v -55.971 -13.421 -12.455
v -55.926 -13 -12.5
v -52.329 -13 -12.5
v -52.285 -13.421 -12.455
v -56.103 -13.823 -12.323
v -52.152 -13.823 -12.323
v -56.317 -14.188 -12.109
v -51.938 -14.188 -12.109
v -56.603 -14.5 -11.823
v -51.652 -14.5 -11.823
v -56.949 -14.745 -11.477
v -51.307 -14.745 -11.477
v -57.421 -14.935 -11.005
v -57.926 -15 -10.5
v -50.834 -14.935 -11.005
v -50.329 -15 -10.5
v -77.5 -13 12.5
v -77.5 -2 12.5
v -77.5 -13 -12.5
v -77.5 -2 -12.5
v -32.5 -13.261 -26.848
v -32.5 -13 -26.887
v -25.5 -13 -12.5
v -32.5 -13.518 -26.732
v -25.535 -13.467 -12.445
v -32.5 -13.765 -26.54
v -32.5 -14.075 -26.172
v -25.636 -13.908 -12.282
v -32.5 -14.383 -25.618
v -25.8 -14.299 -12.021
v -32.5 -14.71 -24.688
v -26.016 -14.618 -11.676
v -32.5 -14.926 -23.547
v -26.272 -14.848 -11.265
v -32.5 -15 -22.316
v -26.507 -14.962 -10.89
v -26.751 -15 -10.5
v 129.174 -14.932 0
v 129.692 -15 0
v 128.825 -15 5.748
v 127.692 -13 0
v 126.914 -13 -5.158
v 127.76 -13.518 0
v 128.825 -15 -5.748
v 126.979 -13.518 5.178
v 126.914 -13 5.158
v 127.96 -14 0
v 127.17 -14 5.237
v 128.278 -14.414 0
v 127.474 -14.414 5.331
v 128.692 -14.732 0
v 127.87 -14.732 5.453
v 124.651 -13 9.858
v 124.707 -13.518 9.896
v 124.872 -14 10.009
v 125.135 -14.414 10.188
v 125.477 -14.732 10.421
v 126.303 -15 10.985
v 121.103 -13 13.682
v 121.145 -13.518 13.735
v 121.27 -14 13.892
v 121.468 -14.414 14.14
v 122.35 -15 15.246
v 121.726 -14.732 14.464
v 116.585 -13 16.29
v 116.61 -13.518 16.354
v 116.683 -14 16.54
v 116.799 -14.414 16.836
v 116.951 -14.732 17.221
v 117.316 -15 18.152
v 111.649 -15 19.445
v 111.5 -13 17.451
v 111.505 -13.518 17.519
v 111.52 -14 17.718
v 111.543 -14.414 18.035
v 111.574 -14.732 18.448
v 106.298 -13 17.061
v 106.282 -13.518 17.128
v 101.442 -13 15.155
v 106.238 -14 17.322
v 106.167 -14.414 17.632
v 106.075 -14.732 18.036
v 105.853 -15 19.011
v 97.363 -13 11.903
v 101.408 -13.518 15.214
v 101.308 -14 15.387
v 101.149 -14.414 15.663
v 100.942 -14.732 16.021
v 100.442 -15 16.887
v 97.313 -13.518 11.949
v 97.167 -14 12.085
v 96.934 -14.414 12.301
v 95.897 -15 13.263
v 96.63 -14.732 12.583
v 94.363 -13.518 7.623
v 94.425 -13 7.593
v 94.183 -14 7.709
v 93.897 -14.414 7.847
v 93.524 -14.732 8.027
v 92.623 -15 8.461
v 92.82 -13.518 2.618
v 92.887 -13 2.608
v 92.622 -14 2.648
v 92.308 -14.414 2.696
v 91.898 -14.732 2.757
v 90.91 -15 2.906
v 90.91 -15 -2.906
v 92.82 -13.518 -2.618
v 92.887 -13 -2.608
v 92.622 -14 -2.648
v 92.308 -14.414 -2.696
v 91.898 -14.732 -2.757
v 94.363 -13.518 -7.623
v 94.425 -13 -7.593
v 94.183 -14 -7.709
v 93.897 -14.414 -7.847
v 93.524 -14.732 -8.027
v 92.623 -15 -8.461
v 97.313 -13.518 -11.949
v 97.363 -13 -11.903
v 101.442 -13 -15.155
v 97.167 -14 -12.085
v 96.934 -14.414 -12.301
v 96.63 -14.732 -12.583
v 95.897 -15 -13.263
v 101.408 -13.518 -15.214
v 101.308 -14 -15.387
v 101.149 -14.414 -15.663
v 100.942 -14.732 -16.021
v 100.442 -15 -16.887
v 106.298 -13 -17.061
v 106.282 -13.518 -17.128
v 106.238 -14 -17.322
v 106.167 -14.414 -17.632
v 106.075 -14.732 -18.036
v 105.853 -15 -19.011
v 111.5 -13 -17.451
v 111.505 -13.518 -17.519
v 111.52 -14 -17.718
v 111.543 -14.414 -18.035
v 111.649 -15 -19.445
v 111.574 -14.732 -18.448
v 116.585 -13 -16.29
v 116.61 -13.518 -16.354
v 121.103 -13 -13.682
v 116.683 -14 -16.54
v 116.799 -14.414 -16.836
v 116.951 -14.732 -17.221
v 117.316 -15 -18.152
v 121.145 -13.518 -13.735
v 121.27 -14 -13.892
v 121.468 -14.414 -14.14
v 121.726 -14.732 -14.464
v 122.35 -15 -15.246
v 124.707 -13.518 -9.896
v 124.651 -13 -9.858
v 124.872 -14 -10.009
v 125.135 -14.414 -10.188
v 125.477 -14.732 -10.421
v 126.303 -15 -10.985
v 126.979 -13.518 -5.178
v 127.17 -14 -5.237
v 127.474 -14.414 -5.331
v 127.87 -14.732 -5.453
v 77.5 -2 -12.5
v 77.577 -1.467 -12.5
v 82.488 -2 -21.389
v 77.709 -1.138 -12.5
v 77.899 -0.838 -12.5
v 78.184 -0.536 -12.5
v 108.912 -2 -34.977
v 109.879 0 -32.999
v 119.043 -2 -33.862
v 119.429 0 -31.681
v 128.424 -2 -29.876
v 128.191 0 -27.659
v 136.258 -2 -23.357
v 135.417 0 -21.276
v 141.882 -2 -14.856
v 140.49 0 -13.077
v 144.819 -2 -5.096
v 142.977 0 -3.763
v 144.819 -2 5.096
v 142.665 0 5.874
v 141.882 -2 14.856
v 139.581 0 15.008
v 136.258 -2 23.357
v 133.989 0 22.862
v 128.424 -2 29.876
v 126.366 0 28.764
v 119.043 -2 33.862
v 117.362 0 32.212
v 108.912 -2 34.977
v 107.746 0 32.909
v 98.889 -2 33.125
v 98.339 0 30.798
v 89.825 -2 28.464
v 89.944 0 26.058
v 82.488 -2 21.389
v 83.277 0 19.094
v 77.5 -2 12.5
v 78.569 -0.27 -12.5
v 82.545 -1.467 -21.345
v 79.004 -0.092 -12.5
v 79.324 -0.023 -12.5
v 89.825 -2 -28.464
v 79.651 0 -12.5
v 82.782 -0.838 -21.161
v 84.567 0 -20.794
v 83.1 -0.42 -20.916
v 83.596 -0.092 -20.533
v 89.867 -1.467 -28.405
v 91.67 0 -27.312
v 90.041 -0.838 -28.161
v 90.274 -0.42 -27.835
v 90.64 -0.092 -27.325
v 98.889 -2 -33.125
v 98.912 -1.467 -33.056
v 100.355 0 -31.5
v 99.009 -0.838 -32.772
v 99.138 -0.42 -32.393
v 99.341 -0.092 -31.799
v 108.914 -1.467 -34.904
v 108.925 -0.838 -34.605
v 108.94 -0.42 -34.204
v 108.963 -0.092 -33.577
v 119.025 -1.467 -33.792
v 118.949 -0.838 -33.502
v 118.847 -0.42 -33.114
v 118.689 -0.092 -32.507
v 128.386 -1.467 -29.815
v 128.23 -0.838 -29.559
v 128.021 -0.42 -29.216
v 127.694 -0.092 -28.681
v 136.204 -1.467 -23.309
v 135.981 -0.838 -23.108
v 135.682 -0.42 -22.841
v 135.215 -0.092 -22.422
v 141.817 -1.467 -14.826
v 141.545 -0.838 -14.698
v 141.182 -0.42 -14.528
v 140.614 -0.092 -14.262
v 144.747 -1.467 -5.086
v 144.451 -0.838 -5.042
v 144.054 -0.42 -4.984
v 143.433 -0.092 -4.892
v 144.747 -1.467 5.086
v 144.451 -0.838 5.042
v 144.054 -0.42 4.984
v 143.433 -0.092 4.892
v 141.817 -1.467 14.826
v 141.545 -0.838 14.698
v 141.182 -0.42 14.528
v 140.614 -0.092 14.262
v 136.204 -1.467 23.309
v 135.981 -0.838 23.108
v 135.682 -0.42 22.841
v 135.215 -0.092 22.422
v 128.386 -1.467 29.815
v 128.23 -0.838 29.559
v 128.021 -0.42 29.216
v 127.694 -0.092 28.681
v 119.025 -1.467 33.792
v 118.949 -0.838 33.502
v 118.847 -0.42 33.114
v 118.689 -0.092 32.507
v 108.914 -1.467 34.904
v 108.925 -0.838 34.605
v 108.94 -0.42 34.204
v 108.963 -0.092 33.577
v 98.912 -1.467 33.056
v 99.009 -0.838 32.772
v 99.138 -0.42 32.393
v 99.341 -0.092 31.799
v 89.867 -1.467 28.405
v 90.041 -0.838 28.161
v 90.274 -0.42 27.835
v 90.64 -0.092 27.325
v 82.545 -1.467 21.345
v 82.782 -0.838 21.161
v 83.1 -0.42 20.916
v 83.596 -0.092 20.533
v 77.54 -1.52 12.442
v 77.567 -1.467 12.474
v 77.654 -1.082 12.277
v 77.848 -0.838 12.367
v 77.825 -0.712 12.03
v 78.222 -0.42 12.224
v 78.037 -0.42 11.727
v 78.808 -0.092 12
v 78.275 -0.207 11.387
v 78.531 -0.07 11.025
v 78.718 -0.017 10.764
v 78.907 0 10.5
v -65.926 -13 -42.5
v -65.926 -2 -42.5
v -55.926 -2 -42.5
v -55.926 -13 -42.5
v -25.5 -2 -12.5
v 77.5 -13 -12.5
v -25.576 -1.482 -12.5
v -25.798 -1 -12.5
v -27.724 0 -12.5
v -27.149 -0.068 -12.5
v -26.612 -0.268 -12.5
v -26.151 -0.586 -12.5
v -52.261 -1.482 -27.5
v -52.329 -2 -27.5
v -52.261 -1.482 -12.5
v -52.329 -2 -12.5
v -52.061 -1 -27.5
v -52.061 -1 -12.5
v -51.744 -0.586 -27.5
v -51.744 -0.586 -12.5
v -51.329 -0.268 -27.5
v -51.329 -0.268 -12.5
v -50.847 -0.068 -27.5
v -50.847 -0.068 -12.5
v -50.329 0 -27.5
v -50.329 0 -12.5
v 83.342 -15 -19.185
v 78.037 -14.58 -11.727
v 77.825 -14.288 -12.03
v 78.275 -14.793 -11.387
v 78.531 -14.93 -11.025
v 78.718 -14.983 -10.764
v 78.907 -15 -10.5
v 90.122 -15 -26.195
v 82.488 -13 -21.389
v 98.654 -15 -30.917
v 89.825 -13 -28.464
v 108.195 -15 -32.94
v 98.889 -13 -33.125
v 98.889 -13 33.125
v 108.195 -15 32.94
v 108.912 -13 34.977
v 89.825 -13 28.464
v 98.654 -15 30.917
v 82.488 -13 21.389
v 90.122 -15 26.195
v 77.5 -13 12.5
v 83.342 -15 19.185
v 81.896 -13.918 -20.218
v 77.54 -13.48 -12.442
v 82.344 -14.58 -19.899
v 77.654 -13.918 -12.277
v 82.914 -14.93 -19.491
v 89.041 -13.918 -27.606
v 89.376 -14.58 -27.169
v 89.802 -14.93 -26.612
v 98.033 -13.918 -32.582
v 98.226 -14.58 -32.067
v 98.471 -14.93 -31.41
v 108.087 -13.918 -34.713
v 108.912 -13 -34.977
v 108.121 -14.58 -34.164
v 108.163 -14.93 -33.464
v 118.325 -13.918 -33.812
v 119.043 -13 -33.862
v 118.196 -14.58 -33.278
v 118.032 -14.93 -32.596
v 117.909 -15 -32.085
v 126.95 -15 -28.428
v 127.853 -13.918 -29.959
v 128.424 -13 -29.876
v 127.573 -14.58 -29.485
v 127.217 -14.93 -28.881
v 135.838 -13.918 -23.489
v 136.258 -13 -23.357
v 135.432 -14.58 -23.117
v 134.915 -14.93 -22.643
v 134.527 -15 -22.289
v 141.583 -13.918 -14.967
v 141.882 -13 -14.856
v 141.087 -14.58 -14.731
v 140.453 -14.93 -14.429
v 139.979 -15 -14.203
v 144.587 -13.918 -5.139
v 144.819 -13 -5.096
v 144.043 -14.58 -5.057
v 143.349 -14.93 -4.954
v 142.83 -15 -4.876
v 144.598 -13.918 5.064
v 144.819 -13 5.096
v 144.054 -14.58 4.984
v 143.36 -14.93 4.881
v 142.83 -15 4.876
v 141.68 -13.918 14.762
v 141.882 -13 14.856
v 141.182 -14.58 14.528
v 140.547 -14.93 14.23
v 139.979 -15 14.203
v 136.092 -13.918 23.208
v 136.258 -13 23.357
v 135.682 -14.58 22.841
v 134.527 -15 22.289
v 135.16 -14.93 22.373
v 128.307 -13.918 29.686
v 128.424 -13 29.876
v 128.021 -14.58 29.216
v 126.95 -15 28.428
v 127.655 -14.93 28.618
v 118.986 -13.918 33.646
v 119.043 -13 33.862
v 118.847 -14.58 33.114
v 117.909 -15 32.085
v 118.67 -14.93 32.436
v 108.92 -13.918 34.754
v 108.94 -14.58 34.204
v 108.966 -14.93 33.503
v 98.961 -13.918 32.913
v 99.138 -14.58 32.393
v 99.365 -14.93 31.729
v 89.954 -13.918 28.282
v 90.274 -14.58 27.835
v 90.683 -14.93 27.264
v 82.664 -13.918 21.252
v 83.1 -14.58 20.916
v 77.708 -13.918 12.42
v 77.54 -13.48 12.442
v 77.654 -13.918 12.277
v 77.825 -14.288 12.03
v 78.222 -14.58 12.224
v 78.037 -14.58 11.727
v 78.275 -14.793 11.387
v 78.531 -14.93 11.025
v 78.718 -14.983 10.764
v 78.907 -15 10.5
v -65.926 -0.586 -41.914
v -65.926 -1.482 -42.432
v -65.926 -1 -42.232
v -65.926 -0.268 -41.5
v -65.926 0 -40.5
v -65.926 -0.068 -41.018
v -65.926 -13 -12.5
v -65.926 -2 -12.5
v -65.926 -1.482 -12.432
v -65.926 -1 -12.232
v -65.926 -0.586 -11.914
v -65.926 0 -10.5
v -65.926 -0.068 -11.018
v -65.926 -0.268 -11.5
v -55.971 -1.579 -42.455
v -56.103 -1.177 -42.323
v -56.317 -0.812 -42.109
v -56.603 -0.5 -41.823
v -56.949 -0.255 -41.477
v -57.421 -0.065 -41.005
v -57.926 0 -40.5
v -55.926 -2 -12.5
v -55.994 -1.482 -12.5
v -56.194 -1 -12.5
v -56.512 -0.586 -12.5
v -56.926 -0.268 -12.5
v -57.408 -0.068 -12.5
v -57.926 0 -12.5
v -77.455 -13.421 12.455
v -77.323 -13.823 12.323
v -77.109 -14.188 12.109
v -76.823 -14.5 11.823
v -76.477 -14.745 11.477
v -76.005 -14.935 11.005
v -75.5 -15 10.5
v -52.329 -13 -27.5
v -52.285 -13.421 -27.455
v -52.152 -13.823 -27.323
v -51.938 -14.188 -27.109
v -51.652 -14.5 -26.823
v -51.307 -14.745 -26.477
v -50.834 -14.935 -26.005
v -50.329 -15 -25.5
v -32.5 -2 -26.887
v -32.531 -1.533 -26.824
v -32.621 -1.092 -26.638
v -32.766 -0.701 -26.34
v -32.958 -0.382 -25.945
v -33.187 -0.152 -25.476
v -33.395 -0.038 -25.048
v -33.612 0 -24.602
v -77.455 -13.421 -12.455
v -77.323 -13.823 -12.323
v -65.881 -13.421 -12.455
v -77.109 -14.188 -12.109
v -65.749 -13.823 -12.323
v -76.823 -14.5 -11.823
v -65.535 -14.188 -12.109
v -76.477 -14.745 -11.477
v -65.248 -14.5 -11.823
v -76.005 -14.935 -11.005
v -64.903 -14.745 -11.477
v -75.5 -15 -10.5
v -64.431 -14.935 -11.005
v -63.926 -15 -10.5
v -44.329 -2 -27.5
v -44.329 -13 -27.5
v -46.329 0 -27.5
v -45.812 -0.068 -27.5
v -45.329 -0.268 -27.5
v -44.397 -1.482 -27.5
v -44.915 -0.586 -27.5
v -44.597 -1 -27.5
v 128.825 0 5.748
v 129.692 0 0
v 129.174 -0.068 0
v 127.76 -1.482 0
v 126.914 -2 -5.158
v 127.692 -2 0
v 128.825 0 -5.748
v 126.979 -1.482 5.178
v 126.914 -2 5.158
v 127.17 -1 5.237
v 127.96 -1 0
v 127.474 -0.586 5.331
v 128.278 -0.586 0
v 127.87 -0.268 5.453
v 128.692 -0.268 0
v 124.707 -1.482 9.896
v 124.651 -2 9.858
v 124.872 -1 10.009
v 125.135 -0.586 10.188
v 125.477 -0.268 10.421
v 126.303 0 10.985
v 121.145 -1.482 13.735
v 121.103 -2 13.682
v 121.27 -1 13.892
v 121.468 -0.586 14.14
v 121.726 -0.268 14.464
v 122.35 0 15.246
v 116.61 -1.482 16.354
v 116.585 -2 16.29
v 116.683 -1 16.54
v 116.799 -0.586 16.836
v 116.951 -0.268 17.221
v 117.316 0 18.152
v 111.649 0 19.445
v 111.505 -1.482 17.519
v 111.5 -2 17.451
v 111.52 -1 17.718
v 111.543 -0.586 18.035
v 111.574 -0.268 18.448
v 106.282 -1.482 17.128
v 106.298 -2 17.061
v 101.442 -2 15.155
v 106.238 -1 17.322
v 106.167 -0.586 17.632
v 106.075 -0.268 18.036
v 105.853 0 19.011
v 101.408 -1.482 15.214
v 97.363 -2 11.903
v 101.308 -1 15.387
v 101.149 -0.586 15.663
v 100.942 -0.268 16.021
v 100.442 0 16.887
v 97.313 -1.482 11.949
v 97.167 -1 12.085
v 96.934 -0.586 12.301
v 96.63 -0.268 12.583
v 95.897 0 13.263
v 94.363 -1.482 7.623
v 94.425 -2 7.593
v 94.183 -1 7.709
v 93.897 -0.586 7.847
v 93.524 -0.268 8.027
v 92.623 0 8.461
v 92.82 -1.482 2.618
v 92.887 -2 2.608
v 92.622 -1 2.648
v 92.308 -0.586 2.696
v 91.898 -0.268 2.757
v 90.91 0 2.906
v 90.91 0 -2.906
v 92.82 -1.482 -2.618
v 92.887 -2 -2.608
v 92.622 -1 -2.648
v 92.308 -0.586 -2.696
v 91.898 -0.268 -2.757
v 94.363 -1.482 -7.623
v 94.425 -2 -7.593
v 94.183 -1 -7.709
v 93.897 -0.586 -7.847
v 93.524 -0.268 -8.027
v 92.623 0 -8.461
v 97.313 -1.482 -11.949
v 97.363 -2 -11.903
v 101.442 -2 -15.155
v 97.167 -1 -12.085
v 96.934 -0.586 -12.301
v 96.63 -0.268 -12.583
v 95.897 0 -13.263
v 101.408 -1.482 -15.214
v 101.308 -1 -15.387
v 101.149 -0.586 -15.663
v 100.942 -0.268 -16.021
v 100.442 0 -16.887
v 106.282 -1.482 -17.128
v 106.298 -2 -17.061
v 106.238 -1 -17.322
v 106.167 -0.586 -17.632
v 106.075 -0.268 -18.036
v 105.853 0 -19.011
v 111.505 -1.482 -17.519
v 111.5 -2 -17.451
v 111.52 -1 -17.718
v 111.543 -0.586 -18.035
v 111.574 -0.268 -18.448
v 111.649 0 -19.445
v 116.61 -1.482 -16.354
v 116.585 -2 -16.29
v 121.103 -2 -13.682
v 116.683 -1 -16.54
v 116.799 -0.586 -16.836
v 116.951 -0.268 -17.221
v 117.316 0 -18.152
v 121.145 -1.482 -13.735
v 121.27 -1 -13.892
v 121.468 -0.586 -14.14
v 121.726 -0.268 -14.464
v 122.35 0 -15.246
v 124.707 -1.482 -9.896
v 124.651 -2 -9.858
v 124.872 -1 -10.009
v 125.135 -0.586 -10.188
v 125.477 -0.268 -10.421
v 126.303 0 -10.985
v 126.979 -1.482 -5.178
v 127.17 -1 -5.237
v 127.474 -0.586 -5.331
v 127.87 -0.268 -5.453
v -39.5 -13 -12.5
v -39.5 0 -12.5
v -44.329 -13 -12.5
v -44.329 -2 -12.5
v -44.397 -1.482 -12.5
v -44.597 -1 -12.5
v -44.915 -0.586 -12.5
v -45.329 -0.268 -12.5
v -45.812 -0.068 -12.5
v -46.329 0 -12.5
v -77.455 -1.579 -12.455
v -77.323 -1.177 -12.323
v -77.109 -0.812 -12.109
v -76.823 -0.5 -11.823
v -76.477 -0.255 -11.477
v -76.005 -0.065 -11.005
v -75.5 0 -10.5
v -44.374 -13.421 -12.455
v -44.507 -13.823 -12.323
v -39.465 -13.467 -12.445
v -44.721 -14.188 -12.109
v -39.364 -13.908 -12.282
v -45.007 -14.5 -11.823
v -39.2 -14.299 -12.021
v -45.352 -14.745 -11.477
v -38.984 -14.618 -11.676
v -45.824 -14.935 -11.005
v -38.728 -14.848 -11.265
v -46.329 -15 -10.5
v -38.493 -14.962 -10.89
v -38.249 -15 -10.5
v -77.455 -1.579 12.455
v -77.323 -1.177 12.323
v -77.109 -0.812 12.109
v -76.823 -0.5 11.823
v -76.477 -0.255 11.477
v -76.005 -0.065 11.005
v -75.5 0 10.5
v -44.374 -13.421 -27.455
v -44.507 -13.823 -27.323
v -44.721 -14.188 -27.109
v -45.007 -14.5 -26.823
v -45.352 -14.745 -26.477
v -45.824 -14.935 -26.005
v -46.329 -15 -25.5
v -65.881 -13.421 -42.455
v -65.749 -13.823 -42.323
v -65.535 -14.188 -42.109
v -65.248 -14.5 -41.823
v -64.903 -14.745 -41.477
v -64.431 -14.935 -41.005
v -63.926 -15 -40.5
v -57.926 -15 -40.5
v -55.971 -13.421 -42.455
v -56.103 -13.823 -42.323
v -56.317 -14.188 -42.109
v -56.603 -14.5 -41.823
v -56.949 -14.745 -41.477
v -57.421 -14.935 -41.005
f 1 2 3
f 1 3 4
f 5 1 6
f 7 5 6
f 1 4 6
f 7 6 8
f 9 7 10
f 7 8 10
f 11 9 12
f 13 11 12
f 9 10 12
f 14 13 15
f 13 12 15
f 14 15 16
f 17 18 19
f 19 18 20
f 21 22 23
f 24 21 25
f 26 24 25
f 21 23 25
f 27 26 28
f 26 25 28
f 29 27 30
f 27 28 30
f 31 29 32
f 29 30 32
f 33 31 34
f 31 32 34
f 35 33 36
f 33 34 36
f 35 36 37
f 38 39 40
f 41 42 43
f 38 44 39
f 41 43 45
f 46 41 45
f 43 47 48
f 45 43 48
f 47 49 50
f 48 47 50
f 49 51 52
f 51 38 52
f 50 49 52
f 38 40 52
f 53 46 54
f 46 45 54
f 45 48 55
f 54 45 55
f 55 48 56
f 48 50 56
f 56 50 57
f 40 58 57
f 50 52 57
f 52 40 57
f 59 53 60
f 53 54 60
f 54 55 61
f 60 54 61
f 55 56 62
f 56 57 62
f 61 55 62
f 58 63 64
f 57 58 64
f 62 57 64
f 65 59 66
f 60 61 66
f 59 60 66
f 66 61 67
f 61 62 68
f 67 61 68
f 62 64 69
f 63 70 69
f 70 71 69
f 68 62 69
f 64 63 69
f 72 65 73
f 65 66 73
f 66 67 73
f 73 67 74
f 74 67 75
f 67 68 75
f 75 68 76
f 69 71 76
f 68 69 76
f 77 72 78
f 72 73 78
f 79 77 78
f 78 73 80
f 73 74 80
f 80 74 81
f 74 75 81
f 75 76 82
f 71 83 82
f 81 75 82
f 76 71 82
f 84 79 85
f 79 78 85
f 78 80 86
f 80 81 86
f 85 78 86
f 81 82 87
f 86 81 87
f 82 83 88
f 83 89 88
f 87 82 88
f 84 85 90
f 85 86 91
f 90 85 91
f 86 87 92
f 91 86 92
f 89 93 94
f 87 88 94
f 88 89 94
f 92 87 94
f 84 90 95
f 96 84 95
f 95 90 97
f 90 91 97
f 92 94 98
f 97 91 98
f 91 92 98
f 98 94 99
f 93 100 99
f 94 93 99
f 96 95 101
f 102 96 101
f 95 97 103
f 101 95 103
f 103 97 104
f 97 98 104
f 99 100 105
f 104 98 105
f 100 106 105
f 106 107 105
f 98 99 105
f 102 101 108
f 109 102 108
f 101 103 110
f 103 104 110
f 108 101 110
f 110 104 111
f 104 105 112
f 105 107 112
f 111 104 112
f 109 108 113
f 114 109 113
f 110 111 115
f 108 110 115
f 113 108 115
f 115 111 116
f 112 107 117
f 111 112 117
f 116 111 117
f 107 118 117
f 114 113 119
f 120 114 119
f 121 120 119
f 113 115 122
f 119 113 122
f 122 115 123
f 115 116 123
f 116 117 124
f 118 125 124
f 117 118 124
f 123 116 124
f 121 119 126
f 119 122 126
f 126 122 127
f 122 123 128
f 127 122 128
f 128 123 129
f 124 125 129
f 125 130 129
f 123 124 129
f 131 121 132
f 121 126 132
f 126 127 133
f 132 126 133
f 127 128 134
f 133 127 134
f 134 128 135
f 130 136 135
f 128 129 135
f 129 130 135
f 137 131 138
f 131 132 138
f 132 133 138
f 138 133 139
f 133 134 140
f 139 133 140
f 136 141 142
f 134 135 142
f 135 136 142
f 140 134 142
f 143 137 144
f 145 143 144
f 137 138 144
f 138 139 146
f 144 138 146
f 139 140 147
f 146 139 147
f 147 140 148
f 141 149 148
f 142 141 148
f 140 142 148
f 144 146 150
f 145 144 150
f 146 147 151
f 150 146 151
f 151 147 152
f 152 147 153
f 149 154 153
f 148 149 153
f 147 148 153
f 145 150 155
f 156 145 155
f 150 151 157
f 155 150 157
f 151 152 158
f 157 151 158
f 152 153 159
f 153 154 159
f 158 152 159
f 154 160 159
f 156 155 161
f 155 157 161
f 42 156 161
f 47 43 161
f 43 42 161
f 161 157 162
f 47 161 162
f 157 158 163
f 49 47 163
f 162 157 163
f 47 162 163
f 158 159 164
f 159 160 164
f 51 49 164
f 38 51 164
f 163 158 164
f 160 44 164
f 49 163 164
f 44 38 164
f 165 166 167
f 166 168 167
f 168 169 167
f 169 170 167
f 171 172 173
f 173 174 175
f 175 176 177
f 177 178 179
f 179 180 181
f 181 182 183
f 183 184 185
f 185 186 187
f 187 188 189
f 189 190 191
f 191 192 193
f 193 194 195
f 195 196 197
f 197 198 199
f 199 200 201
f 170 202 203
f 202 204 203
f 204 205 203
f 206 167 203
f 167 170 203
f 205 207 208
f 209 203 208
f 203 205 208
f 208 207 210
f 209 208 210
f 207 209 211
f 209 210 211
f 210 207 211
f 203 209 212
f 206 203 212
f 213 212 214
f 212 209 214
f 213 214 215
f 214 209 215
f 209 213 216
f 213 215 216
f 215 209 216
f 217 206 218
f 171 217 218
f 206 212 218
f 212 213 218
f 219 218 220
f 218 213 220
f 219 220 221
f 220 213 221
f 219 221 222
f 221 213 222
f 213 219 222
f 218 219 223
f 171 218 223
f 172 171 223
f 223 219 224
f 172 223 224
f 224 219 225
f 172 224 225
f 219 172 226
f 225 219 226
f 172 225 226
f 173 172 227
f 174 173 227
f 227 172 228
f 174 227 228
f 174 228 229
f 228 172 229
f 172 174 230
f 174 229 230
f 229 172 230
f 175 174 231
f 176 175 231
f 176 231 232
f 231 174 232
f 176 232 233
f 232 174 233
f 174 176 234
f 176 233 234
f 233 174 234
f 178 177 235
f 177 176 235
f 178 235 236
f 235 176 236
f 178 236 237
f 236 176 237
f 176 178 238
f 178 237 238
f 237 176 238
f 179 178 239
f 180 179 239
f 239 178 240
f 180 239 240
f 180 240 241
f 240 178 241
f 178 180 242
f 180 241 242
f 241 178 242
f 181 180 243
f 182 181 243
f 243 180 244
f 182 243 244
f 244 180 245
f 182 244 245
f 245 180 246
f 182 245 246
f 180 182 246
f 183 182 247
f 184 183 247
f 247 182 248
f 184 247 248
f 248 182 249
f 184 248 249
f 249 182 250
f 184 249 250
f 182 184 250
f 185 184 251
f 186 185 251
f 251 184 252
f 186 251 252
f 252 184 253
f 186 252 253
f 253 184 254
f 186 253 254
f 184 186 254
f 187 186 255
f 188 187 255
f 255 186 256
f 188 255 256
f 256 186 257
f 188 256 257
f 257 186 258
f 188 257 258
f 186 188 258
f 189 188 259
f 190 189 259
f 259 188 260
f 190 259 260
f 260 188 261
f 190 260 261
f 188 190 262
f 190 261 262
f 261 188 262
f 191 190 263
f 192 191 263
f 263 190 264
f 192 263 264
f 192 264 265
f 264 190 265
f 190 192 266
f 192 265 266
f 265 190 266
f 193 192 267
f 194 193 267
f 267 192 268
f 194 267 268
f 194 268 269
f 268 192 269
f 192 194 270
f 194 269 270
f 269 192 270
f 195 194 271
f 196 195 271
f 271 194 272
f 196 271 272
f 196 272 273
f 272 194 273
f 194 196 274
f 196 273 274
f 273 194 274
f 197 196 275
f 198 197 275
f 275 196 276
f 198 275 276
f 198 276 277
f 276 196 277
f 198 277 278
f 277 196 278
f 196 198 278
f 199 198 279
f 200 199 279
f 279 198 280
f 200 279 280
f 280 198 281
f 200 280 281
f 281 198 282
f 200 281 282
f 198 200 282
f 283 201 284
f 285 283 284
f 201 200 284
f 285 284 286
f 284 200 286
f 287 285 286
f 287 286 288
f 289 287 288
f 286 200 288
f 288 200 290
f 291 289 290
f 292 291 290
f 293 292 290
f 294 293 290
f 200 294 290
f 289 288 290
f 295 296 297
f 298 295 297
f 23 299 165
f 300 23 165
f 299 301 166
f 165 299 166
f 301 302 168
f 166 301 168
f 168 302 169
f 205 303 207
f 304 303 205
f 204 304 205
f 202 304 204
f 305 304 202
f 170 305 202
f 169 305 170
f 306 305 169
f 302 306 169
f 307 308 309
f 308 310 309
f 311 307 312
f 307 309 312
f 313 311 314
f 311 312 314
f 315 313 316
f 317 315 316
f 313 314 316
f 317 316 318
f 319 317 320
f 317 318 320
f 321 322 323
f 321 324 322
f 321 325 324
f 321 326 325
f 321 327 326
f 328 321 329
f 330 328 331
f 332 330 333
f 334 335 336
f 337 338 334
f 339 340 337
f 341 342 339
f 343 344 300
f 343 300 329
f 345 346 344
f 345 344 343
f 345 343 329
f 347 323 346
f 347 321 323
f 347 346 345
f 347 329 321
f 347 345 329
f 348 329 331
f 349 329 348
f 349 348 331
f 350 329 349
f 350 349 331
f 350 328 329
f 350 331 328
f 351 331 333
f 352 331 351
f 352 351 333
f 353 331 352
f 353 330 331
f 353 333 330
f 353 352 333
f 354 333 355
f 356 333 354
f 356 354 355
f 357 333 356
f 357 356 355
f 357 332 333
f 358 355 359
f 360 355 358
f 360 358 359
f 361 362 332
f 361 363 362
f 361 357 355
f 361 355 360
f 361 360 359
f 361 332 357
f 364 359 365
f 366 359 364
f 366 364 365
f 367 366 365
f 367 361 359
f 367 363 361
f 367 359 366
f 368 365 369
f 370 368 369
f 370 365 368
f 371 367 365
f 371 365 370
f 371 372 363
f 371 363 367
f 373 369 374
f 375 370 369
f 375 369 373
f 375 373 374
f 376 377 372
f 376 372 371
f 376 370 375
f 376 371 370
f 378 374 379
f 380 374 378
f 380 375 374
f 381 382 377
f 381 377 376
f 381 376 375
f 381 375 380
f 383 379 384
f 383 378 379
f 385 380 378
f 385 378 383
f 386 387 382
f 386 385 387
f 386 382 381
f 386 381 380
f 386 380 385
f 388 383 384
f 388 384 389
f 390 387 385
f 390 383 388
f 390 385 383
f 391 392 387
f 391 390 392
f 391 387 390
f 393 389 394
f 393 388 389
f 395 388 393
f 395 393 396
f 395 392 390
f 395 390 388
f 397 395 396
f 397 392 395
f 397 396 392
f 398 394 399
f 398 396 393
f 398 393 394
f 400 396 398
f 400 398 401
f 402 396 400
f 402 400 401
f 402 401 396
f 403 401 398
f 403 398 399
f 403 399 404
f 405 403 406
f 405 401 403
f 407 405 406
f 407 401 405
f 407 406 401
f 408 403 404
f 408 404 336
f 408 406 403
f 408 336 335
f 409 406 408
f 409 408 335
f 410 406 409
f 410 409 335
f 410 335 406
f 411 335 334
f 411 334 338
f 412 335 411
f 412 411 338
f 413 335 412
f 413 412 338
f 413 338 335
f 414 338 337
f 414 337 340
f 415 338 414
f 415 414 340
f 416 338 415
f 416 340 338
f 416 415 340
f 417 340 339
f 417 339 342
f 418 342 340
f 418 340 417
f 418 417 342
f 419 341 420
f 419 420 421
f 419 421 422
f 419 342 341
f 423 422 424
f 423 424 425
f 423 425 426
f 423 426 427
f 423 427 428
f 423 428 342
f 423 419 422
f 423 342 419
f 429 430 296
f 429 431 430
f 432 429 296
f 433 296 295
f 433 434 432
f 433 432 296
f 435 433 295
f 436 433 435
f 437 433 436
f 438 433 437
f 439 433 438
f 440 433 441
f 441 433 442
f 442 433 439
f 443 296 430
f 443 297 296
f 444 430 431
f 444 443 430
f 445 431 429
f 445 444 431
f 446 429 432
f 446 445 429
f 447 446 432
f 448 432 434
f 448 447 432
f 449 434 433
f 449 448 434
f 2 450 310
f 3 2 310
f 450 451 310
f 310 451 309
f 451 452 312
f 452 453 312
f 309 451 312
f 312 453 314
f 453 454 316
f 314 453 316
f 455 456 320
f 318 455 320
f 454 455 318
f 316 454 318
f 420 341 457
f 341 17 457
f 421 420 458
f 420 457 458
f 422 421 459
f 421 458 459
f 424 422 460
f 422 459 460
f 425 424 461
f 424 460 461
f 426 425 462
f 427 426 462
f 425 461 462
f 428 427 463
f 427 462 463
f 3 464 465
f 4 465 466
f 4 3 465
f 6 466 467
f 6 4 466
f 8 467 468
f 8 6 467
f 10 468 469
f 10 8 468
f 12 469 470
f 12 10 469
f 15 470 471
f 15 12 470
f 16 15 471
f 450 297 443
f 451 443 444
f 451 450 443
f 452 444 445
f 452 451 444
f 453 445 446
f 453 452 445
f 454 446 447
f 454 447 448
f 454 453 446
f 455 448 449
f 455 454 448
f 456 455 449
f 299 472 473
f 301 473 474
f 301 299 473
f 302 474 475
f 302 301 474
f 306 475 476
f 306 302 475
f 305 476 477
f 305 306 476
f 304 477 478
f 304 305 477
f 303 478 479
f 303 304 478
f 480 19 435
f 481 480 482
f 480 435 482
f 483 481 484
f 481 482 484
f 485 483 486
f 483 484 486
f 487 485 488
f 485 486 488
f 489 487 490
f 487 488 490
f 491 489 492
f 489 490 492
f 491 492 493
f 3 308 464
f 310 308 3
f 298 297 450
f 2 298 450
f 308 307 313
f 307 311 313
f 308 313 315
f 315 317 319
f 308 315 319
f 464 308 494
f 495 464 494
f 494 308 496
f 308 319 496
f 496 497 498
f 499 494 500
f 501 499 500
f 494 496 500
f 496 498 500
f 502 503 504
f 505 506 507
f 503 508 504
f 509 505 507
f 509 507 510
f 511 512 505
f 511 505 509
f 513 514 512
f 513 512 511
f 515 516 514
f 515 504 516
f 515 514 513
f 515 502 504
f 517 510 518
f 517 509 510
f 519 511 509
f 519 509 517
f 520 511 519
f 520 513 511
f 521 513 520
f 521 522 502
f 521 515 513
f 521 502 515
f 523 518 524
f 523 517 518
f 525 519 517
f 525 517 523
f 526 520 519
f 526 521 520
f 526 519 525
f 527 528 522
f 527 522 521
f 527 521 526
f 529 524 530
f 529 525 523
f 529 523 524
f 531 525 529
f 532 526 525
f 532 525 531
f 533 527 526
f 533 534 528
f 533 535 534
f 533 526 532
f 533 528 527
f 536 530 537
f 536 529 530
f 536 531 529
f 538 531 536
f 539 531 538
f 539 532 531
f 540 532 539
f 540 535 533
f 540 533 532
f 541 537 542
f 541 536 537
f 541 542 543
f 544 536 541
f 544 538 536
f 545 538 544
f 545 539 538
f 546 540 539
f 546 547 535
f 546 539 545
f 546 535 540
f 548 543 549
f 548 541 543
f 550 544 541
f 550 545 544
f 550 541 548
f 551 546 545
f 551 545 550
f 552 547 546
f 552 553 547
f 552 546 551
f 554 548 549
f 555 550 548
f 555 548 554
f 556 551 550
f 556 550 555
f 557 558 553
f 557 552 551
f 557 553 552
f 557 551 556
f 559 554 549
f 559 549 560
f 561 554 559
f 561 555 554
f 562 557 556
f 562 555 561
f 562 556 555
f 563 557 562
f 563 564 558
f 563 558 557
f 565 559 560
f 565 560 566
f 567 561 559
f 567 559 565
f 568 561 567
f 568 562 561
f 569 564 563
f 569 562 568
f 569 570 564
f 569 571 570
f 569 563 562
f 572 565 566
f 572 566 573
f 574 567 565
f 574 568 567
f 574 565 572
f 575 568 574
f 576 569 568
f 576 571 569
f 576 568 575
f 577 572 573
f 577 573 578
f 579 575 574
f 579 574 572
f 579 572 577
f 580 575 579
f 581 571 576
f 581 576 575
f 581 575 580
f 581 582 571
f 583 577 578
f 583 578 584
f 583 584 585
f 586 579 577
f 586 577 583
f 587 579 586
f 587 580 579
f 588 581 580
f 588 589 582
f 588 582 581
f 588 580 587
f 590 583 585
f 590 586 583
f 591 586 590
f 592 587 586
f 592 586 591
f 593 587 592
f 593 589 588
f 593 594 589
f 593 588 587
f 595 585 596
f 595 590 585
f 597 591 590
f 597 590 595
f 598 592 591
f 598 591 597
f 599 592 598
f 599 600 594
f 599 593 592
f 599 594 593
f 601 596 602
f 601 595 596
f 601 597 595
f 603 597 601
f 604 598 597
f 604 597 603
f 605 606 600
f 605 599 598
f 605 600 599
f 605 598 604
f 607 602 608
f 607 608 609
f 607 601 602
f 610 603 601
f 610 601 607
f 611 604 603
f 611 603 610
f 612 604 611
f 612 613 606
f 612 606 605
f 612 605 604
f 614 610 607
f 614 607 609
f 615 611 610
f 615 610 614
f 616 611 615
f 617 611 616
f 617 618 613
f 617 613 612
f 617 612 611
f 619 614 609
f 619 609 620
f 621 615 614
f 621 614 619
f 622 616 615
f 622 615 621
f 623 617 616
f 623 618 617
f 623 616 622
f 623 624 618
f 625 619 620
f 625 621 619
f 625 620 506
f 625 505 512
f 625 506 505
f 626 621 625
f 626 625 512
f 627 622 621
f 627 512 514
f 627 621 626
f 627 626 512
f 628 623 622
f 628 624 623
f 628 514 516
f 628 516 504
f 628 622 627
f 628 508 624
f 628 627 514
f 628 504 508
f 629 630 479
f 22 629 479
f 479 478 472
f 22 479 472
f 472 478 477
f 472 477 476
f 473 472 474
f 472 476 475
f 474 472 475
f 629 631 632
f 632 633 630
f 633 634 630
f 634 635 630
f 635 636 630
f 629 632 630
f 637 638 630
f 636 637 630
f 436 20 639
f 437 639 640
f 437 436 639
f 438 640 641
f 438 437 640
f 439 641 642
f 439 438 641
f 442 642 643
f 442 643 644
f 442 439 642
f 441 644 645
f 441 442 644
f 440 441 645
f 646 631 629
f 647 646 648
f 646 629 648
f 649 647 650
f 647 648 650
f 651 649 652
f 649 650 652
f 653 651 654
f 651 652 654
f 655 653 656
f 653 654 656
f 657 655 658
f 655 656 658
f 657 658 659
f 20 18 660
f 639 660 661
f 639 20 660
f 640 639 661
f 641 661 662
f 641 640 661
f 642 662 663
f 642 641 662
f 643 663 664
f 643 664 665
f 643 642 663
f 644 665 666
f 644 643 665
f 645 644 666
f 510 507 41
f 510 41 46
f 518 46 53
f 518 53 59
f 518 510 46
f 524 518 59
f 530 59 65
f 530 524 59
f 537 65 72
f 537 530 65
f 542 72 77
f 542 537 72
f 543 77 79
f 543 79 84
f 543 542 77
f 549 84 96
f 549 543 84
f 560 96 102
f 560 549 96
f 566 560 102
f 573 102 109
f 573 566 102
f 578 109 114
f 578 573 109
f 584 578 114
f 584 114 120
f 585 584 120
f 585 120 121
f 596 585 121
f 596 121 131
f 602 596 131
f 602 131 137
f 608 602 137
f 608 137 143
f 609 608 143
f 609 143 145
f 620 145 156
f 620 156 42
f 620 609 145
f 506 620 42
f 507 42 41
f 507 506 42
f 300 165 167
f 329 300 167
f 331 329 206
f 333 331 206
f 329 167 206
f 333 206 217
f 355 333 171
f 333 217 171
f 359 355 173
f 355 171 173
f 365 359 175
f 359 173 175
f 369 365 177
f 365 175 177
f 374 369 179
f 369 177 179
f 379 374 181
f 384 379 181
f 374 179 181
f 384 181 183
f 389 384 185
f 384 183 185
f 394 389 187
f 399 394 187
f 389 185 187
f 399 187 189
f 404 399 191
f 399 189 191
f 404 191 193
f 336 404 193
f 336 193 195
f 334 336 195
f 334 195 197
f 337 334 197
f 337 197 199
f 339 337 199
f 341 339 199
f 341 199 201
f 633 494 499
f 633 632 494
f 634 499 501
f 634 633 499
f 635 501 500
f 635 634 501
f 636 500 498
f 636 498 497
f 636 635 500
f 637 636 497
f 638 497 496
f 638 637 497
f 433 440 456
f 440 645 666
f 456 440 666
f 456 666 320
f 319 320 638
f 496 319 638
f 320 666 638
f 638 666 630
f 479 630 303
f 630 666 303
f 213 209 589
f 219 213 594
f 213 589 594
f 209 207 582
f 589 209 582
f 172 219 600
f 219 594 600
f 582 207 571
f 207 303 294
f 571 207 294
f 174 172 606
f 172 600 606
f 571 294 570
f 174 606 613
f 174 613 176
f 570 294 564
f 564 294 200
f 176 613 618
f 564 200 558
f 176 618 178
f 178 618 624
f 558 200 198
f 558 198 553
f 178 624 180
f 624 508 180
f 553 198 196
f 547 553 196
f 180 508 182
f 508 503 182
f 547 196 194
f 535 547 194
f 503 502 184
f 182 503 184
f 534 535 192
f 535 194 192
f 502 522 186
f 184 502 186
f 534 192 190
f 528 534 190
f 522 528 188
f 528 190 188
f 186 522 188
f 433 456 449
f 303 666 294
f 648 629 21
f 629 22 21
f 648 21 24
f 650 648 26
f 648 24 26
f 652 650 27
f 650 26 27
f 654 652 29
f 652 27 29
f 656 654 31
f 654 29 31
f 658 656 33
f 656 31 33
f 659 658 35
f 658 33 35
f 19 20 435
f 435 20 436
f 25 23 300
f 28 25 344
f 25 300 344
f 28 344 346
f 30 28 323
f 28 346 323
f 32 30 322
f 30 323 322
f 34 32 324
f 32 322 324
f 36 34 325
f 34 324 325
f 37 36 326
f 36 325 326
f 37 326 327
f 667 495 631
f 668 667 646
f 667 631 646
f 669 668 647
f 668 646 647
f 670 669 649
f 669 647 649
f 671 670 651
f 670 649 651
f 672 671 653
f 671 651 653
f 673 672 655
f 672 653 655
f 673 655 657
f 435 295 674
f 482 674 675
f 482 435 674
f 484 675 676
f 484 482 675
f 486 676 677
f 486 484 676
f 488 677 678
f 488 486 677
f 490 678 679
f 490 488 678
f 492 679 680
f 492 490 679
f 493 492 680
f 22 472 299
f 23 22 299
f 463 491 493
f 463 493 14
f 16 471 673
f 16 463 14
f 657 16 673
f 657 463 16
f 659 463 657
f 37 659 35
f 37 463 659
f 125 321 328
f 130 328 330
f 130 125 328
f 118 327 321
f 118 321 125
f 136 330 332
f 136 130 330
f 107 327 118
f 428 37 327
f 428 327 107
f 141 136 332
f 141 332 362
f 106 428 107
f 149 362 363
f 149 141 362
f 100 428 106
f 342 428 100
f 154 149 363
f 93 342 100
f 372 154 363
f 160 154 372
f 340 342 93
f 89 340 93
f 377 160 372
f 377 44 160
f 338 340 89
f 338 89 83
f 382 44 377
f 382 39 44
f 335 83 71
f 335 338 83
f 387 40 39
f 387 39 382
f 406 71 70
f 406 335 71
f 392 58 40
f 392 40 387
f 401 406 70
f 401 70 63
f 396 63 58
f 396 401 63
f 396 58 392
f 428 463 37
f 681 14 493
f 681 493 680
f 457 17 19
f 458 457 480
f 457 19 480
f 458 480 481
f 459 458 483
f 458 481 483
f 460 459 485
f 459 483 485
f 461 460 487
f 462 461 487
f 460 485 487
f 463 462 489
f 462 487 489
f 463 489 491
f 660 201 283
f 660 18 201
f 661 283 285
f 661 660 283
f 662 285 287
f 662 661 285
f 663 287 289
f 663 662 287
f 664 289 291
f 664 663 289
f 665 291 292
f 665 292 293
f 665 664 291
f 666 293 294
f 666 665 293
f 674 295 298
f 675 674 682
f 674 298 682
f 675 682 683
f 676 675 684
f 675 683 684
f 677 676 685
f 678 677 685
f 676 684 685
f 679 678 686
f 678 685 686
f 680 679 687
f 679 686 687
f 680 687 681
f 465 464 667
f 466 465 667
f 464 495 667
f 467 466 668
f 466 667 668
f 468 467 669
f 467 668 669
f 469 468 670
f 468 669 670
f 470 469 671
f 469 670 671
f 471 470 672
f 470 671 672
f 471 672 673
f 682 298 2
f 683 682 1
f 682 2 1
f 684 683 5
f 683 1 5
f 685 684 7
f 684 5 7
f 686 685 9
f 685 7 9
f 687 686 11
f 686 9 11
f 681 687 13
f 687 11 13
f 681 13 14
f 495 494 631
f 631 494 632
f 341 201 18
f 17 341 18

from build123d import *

# Parameters (mm, degrees)
F0_R     = 17.5
F0_W     = 8
F0_H     = 15
F0_W_2   = 10
F0_H_2   = 30
F1_DEPTH = 15
F2_R     = 2


with BuildPart() as f1:
    # F0 (on Front) → F1 (new body)
    with BuildSketch(Plane.XZ):
        Polygon((77.5, 12.5), (-77.5, 12.5), (-77.5, -12.5), (-65.925811, -12.5), (-55.925811, -12.5), (-52.329316, -12.5), (-44.329316, -12.5), (-39.5, -12.5), (-32.5, -12.5), (-25.5, -12.5), (77.5, -12.5), align=None)
        with BuildLine():
            ThreePointArc((77.5, -12.5), (145.191742, 0), (77.5, 12.5))
            Line((77.5, 12.5), (77.5, -12.5))
        make_face()
        with Locations((110.191742, 0)):
            Circle(F0_R, mode=Mode.SUBTRACT)
        Polygon((-32.5, -26.887495), (-32.5, -12.5), (-39.5, -12.5), align=None)
        Polygon((-32.5, -26.887495), (-25.5, -12.5), (-32.5, -12.5), align=None)
        with Locations((-48.329316, -20)):
            Rectangle(F0_W, F0_H)
        with Locations((-60.925811, -27.5)):
            Rectangle(F0_W_2, F0_H_2)
    extrude(amount=F1_DEPTH)

    # F2
    f2_edges = [f1.edges().sort_by_distance(p)[0] for p in [
        (0, -15, 12.5),
        (-77.5, -15, 0),
        (-71.712905, -15, -12.5),
        (-65.925811, -15, -27.5),
        (-60.925811, -15, -42.5),
        (-55.925811, -15, -27.5),
        (-54.127563, -15, -12.5),
        (-52.329316, -15, -20),
        (-48.329316, -15, -27.5),
        (-44.329316, -15, -20),
        (-41.914658, -15, -12.5),
        (-36, -15, -19.693747),
        (-29, -15, -19.693747),
        (26, -15, -12.5),
        (145.191742, -15, 0),
        (92.691742, -15, 0),
        (-29, 0, -19.693747),
        (92.691742, 0, 0),
        (0, 0, 12.5),
        (-77.5, 0, 0),
        (-60.925811, 0, -42.5),
        (-55.925811, 0, -27.5),
        (-52.329316, 0, -20),
        (145.191742, 0, 0),
        (-44.329316, 0, -20),
        (-71.712905, 0, -12.5),
    ]]
    fillet(f2_edges, radius=F2_R)


solid = f1.part
